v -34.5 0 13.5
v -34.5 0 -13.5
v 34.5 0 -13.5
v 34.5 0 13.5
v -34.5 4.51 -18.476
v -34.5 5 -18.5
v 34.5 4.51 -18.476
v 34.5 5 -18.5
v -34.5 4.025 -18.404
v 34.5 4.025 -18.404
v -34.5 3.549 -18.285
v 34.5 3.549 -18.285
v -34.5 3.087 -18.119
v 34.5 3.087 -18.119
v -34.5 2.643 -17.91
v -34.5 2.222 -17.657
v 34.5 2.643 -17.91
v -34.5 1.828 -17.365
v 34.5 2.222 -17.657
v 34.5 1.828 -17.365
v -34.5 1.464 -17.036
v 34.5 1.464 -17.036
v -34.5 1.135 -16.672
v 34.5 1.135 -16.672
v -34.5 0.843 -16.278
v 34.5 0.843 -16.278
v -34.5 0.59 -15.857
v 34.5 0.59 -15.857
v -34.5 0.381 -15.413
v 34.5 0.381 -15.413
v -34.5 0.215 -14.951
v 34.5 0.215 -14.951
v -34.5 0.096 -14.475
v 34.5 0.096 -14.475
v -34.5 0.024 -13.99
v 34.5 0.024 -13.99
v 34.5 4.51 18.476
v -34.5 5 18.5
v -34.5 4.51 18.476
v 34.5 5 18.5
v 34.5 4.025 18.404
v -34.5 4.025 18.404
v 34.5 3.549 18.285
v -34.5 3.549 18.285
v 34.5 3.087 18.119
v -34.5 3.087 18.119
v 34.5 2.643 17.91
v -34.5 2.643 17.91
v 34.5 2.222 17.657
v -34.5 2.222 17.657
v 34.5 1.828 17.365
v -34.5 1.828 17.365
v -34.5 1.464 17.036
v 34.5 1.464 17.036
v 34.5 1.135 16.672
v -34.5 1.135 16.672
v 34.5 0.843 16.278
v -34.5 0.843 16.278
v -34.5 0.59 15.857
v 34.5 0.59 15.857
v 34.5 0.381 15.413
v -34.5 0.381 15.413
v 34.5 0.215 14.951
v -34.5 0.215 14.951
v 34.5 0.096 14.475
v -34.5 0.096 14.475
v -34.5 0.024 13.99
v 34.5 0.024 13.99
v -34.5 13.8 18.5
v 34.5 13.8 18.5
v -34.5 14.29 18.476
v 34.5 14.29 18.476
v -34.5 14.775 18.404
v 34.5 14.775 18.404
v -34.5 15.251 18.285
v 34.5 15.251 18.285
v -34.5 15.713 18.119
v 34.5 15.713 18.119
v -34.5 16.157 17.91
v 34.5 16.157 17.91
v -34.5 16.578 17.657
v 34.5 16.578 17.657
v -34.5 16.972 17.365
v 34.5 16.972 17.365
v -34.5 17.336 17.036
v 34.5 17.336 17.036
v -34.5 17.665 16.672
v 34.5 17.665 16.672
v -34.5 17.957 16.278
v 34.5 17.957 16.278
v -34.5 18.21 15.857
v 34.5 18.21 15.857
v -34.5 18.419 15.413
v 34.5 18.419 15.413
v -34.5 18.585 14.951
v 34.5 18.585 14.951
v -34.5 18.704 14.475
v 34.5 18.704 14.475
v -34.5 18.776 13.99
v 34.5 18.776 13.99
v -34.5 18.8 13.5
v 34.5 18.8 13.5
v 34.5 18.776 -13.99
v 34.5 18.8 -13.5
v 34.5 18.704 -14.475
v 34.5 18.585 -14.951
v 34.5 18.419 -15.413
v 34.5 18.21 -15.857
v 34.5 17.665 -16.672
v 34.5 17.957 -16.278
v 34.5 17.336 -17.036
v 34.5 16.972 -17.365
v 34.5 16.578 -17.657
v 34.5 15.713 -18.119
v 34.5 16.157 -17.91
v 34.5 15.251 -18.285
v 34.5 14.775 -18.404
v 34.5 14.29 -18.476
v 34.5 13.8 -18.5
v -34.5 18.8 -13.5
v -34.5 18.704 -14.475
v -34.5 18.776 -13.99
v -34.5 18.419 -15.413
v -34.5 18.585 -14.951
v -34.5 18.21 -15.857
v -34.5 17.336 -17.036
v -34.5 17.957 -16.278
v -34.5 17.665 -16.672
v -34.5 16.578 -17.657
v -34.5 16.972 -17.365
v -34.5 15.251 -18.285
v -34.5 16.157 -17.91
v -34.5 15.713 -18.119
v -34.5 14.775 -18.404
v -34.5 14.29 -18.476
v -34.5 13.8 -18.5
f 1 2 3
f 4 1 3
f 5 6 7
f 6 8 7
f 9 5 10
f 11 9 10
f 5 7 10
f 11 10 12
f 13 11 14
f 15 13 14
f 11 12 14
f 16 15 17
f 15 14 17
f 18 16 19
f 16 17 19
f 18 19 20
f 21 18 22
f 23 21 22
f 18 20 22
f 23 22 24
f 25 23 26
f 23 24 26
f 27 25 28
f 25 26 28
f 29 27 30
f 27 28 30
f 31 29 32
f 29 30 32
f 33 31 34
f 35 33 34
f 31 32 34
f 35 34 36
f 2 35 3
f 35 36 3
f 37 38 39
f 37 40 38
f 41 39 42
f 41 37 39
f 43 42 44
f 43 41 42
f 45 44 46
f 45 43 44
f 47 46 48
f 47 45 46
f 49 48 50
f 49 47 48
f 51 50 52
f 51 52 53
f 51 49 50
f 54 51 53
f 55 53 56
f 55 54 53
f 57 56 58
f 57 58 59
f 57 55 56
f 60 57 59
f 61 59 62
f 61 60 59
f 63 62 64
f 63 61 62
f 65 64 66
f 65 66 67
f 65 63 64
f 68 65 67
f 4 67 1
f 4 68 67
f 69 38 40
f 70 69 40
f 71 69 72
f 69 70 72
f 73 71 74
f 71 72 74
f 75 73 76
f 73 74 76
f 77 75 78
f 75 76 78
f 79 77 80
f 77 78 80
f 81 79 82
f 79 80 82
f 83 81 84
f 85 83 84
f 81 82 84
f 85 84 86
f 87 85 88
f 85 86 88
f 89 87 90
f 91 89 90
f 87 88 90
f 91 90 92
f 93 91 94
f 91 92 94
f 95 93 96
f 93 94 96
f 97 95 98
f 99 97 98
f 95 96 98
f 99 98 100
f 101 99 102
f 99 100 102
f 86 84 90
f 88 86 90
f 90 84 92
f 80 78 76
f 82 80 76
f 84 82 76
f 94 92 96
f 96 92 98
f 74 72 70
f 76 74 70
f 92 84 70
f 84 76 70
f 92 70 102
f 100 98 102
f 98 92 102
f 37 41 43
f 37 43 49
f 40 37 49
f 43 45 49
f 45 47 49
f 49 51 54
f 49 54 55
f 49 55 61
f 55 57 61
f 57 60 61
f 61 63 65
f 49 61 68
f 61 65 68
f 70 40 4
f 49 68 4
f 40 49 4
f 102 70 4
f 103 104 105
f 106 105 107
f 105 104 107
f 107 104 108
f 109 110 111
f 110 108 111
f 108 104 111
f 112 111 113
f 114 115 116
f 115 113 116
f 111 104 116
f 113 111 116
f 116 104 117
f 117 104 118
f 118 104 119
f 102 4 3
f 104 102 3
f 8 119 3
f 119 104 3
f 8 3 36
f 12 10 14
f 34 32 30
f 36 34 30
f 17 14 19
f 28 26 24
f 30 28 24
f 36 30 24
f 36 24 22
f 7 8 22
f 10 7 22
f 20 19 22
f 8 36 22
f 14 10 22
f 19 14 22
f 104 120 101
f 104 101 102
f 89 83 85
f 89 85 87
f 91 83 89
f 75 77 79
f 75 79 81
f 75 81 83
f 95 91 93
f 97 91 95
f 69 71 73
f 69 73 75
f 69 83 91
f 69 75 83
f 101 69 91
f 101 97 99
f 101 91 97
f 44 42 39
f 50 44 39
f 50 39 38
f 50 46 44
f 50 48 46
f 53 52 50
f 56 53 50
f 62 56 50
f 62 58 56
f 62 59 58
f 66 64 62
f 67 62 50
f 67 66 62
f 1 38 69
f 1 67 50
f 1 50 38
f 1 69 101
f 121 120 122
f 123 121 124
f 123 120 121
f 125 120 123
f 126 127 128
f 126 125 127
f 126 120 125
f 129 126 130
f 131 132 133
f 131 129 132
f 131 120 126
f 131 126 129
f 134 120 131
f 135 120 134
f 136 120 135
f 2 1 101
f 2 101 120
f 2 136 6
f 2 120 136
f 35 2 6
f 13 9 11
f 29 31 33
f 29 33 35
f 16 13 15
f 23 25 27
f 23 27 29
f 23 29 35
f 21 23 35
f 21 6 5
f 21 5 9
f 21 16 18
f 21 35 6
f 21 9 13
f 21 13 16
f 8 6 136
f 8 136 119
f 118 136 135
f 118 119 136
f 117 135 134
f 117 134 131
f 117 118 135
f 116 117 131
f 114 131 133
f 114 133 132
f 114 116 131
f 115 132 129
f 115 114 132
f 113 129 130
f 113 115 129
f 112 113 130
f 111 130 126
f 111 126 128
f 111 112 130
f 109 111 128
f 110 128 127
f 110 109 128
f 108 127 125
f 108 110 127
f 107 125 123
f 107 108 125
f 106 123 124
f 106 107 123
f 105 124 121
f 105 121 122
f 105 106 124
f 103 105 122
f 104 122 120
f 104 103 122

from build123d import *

# Parameters (mm, degrees)
SKETCH_1_W      = 69
SKETCH_1_H      = 37
EXTRUDE_1_DEPTH = 18.8
FILLET_1_R      = 5


with BuildPart() as part:
    # 草图1 → 凸台-拉伸1 (new body)
    with BuildSketch(Plane(origin=(0, 0, 0), x_dir=(1, 0, 0), z_dir=(0, 1, 0))):
        Rectangle(SKETCH_1_W, SKETCH_1_H)
    extrude(amount=EXTRUDE_1_DEPTH)

    # 圆角1
    fillet_1_edges = [part.edges().sort_by_distance(p)[0] for p in [
        (0, 18.8, 18.5),
        (0, 0, 18.5),
        (0, 0, -18.5),
        (0, 18.8, -18.5),
    ]]
    fillet(fillet_1_edges, radius=FILLET_1_R)


solid = part.part
